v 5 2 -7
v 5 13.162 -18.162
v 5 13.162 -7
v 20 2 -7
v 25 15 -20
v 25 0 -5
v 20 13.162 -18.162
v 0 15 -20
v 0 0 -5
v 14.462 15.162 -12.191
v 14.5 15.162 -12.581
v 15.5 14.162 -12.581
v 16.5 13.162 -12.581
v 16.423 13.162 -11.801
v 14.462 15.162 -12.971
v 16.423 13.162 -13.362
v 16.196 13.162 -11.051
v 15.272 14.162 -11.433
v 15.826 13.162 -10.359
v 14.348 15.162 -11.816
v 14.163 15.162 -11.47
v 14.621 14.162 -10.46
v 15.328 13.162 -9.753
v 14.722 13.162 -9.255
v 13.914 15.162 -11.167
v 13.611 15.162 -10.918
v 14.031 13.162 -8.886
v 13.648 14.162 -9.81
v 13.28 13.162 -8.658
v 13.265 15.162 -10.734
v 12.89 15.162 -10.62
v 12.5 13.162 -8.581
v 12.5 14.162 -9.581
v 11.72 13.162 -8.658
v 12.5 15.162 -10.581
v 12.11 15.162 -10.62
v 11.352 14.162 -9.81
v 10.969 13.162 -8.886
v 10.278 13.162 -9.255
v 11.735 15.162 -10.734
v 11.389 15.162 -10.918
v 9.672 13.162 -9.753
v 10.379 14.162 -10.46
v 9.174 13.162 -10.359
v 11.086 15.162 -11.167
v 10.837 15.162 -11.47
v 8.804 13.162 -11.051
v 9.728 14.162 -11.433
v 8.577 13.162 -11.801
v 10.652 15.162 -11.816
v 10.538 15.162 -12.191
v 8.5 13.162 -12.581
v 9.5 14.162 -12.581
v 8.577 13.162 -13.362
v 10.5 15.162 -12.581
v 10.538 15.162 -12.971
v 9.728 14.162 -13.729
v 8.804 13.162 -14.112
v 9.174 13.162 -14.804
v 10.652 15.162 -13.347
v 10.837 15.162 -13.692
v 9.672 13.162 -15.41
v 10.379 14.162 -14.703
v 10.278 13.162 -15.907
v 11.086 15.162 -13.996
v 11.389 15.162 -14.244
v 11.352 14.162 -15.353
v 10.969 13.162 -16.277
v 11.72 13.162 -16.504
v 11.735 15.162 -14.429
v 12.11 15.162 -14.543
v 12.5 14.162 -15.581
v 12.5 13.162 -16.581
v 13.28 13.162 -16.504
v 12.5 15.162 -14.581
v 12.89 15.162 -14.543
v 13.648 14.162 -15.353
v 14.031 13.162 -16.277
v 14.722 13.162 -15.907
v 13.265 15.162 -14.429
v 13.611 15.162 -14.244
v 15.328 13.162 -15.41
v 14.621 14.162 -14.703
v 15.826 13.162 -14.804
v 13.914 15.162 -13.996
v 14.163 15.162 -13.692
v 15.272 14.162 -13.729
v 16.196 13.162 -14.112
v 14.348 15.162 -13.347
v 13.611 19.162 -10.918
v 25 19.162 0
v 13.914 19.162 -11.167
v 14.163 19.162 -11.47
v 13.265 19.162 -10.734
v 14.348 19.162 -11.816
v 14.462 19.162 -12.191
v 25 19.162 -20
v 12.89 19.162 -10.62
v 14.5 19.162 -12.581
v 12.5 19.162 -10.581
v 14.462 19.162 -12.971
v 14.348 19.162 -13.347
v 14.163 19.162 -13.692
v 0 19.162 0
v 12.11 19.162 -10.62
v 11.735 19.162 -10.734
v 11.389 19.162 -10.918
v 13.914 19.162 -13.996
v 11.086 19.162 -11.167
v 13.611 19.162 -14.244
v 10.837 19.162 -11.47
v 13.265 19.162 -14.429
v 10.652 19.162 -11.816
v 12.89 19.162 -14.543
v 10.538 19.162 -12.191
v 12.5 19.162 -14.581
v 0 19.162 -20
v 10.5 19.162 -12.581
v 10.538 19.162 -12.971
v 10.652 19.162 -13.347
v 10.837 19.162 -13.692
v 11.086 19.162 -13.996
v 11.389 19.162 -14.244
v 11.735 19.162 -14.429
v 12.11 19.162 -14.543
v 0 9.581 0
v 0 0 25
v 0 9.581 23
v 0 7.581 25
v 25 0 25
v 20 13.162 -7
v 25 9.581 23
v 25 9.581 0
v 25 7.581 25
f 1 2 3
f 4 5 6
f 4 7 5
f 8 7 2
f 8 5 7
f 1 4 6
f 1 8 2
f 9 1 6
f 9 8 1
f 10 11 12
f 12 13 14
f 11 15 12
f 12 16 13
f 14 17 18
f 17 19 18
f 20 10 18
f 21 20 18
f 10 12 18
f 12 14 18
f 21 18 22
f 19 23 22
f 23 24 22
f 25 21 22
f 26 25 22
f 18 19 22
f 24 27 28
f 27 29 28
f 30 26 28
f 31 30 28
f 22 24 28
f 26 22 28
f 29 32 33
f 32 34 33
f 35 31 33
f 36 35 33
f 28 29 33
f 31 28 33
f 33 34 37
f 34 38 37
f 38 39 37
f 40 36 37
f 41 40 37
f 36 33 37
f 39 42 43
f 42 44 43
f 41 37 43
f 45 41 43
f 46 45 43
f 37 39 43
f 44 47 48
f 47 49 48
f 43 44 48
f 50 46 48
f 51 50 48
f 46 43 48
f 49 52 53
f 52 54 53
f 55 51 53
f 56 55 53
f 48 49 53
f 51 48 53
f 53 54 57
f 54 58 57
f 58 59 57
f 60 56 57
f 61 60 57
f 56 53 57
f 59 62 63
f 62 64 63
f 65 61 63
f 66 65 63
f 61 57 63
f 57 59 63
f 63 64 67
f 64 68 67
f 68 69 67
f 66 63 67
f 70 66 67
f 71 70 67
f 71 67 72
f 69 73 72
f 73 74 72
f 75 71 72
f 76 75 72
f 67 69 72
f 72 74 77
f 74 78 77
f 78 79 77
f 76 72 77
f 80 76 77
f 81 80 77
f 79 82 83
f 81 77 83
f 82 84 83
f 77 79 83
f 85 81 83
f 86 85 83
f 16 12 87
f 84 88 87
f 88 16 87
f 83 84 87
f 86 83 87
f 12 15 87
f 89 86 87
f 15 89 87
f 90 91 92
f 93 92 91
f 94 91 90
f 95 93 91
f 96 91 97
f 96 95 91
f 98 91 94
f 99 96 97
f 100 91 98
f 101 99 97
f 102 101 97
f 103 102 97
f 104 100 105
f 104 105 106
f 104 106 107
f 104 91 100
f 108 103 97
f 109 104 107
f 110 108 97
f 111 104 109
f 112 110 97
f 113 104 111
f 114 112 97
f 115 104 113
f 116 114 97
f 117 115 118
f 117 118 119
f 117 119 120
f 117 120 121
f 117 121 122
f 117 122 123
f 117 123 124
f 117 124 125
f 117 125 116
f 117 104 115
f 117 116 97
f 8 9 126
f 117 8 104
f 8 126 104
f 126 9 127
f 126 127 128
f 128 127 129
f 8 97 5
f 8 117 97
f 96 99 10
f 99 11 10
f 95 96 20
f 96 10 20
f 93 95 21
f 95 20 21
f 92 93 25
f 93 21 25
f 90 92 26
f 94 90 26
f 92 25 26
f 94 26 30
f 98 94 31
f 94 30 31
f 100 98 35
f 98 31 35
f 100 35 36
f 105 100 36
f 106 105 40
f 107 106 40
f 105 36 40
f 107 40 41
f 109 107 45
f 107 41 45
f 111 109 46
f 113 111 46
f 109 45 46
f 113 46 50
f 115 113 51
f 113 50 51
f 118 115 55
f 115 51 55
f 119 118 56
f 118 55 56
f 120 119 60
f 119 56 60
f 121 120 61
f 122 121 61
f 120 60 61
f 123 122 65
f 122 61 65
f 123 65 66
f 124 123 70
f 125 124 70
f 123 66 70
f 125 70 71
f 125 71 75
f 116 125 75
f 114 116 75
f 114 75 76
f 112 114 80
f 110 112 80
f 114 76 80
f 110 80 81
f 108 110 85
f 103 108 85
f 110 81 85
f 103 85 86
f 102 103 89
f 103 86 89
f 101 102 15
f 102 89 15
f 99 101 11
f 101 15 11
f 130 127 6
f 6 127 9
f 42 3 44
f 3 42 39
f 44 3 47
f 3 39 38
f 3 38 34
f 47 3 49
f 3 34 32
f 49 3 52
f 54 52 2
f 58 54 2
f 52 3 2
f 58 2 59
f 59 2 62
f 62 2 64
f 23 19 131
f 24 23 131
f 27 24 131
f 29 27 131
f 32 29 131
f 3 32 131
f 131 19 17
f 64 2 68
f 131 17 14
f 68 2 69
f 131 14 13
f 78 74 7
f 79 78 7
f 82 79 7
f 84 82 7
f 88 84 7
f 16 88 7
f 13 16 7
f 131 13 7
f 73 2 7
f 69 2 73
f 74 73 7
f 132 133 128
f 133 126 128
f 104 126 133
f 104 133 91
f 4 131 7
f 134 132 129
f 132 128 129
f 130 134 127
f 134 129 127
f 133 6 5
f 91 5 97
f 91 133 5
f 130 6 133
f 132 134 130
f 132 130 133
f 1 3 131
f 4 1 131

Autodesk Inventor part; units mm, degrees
ref_plane "YZ Plane" through (0, 0, 0) normal (1, 0, 0) x (0, 1, 0)
ref_plane "XZ Plane" through (0, 0, 0) normal (0, 1, 0) x (-1, 0, 0)
sketch "Sketch1" plane through (0, 0, 0) normal (1, 0, 0) x (0, 1, 0)
  line L0 (0, 0) -> (9.5813, 0)
  line L1 (9.5813, 0) -> (9.5812, 23)
  line L2 (7.5812, 25) -> (0, 25)
  line L3 (0, 25) -> (0, 0)
  line L4 (9.5812, 23) -> (7.5812, 25)
  line L5 (0, 0) -> (19.1625, 0)
  line L6 (19.1625, 0) -> (19.1625, -20)
  line L7 (19.1625, -20) -> (15, -20)
  line L8 (0, -5) -> (0, 0)
  line L9 (19.1625, -20) -> (11.1625, -20)
  line L10 (15, -20) -> (0, -5)
  point P0 (9.5812, 25)
  point P1 (0, -20)
  dimension "d0" = 9.5813
  dimension "d1" = 25
  dimension "d2" = 2
  dimension "d3" = 2
  dimension "d4" = 20
  dimension "d5" = 19.1625
  dimension "d8" = 15
  dimension "d9" = 15
extrude "Extrusion1" add sketch "Sketch1" along normal blind 25
ref_plane "Work Plane1" through (0, 13.1625, 0) normal (0, 1, 0) x (1, 0, 0)
sketch "Sketch2" plane through (0, 13.1625, 0) normal (0, 1, 0) x (1, 0, 0)
  line L0 (20, 30.2149) -> (5, 30.2149)
  line L1 (5, 30.2149) -> (5, 7)
  line L2 (5, 7) -> (20, 7)
  line L3 (20, 7) -> (20, 30.2149)
  line L4 (25, 5) -> (25, 20) projected
  line L5 (0, 5) -> (0, 20) projected
  line L6 (0, 0) -> (25, 0) projected
  dimension "d13" = 5
  dimension "d14" = 5
  dimension "d15" = 7
extrude "Extrusion2" cut sketch "Sketch2" against normal blind 25
sketch "Sketch3" plane through (0, 13.1625, 0) normal (0, -1, 0) x (1, 0, 0)
  circle A0 centre (12.5, -12.5813) radius 2
  line L0 (20, -7) -> (20, -18.1625) projected
  point P0 (0, 0)
  point P1 (20, -12.5813)
  dimension "d18" = 4
  dimension "d19" = 0
extrude "Extrusion3" cut sketch "Sketch3" against normal blind 25
chamfer "Chamfer1" distance 2 angle 45 1 edges at (10.5, 13.1625, -12.5813)
equation "\"d3\" = d2"
equation "\"d5\" = 2 * d0"
equation "\"d9\" = d8"
properties part number "front wall bkt"
